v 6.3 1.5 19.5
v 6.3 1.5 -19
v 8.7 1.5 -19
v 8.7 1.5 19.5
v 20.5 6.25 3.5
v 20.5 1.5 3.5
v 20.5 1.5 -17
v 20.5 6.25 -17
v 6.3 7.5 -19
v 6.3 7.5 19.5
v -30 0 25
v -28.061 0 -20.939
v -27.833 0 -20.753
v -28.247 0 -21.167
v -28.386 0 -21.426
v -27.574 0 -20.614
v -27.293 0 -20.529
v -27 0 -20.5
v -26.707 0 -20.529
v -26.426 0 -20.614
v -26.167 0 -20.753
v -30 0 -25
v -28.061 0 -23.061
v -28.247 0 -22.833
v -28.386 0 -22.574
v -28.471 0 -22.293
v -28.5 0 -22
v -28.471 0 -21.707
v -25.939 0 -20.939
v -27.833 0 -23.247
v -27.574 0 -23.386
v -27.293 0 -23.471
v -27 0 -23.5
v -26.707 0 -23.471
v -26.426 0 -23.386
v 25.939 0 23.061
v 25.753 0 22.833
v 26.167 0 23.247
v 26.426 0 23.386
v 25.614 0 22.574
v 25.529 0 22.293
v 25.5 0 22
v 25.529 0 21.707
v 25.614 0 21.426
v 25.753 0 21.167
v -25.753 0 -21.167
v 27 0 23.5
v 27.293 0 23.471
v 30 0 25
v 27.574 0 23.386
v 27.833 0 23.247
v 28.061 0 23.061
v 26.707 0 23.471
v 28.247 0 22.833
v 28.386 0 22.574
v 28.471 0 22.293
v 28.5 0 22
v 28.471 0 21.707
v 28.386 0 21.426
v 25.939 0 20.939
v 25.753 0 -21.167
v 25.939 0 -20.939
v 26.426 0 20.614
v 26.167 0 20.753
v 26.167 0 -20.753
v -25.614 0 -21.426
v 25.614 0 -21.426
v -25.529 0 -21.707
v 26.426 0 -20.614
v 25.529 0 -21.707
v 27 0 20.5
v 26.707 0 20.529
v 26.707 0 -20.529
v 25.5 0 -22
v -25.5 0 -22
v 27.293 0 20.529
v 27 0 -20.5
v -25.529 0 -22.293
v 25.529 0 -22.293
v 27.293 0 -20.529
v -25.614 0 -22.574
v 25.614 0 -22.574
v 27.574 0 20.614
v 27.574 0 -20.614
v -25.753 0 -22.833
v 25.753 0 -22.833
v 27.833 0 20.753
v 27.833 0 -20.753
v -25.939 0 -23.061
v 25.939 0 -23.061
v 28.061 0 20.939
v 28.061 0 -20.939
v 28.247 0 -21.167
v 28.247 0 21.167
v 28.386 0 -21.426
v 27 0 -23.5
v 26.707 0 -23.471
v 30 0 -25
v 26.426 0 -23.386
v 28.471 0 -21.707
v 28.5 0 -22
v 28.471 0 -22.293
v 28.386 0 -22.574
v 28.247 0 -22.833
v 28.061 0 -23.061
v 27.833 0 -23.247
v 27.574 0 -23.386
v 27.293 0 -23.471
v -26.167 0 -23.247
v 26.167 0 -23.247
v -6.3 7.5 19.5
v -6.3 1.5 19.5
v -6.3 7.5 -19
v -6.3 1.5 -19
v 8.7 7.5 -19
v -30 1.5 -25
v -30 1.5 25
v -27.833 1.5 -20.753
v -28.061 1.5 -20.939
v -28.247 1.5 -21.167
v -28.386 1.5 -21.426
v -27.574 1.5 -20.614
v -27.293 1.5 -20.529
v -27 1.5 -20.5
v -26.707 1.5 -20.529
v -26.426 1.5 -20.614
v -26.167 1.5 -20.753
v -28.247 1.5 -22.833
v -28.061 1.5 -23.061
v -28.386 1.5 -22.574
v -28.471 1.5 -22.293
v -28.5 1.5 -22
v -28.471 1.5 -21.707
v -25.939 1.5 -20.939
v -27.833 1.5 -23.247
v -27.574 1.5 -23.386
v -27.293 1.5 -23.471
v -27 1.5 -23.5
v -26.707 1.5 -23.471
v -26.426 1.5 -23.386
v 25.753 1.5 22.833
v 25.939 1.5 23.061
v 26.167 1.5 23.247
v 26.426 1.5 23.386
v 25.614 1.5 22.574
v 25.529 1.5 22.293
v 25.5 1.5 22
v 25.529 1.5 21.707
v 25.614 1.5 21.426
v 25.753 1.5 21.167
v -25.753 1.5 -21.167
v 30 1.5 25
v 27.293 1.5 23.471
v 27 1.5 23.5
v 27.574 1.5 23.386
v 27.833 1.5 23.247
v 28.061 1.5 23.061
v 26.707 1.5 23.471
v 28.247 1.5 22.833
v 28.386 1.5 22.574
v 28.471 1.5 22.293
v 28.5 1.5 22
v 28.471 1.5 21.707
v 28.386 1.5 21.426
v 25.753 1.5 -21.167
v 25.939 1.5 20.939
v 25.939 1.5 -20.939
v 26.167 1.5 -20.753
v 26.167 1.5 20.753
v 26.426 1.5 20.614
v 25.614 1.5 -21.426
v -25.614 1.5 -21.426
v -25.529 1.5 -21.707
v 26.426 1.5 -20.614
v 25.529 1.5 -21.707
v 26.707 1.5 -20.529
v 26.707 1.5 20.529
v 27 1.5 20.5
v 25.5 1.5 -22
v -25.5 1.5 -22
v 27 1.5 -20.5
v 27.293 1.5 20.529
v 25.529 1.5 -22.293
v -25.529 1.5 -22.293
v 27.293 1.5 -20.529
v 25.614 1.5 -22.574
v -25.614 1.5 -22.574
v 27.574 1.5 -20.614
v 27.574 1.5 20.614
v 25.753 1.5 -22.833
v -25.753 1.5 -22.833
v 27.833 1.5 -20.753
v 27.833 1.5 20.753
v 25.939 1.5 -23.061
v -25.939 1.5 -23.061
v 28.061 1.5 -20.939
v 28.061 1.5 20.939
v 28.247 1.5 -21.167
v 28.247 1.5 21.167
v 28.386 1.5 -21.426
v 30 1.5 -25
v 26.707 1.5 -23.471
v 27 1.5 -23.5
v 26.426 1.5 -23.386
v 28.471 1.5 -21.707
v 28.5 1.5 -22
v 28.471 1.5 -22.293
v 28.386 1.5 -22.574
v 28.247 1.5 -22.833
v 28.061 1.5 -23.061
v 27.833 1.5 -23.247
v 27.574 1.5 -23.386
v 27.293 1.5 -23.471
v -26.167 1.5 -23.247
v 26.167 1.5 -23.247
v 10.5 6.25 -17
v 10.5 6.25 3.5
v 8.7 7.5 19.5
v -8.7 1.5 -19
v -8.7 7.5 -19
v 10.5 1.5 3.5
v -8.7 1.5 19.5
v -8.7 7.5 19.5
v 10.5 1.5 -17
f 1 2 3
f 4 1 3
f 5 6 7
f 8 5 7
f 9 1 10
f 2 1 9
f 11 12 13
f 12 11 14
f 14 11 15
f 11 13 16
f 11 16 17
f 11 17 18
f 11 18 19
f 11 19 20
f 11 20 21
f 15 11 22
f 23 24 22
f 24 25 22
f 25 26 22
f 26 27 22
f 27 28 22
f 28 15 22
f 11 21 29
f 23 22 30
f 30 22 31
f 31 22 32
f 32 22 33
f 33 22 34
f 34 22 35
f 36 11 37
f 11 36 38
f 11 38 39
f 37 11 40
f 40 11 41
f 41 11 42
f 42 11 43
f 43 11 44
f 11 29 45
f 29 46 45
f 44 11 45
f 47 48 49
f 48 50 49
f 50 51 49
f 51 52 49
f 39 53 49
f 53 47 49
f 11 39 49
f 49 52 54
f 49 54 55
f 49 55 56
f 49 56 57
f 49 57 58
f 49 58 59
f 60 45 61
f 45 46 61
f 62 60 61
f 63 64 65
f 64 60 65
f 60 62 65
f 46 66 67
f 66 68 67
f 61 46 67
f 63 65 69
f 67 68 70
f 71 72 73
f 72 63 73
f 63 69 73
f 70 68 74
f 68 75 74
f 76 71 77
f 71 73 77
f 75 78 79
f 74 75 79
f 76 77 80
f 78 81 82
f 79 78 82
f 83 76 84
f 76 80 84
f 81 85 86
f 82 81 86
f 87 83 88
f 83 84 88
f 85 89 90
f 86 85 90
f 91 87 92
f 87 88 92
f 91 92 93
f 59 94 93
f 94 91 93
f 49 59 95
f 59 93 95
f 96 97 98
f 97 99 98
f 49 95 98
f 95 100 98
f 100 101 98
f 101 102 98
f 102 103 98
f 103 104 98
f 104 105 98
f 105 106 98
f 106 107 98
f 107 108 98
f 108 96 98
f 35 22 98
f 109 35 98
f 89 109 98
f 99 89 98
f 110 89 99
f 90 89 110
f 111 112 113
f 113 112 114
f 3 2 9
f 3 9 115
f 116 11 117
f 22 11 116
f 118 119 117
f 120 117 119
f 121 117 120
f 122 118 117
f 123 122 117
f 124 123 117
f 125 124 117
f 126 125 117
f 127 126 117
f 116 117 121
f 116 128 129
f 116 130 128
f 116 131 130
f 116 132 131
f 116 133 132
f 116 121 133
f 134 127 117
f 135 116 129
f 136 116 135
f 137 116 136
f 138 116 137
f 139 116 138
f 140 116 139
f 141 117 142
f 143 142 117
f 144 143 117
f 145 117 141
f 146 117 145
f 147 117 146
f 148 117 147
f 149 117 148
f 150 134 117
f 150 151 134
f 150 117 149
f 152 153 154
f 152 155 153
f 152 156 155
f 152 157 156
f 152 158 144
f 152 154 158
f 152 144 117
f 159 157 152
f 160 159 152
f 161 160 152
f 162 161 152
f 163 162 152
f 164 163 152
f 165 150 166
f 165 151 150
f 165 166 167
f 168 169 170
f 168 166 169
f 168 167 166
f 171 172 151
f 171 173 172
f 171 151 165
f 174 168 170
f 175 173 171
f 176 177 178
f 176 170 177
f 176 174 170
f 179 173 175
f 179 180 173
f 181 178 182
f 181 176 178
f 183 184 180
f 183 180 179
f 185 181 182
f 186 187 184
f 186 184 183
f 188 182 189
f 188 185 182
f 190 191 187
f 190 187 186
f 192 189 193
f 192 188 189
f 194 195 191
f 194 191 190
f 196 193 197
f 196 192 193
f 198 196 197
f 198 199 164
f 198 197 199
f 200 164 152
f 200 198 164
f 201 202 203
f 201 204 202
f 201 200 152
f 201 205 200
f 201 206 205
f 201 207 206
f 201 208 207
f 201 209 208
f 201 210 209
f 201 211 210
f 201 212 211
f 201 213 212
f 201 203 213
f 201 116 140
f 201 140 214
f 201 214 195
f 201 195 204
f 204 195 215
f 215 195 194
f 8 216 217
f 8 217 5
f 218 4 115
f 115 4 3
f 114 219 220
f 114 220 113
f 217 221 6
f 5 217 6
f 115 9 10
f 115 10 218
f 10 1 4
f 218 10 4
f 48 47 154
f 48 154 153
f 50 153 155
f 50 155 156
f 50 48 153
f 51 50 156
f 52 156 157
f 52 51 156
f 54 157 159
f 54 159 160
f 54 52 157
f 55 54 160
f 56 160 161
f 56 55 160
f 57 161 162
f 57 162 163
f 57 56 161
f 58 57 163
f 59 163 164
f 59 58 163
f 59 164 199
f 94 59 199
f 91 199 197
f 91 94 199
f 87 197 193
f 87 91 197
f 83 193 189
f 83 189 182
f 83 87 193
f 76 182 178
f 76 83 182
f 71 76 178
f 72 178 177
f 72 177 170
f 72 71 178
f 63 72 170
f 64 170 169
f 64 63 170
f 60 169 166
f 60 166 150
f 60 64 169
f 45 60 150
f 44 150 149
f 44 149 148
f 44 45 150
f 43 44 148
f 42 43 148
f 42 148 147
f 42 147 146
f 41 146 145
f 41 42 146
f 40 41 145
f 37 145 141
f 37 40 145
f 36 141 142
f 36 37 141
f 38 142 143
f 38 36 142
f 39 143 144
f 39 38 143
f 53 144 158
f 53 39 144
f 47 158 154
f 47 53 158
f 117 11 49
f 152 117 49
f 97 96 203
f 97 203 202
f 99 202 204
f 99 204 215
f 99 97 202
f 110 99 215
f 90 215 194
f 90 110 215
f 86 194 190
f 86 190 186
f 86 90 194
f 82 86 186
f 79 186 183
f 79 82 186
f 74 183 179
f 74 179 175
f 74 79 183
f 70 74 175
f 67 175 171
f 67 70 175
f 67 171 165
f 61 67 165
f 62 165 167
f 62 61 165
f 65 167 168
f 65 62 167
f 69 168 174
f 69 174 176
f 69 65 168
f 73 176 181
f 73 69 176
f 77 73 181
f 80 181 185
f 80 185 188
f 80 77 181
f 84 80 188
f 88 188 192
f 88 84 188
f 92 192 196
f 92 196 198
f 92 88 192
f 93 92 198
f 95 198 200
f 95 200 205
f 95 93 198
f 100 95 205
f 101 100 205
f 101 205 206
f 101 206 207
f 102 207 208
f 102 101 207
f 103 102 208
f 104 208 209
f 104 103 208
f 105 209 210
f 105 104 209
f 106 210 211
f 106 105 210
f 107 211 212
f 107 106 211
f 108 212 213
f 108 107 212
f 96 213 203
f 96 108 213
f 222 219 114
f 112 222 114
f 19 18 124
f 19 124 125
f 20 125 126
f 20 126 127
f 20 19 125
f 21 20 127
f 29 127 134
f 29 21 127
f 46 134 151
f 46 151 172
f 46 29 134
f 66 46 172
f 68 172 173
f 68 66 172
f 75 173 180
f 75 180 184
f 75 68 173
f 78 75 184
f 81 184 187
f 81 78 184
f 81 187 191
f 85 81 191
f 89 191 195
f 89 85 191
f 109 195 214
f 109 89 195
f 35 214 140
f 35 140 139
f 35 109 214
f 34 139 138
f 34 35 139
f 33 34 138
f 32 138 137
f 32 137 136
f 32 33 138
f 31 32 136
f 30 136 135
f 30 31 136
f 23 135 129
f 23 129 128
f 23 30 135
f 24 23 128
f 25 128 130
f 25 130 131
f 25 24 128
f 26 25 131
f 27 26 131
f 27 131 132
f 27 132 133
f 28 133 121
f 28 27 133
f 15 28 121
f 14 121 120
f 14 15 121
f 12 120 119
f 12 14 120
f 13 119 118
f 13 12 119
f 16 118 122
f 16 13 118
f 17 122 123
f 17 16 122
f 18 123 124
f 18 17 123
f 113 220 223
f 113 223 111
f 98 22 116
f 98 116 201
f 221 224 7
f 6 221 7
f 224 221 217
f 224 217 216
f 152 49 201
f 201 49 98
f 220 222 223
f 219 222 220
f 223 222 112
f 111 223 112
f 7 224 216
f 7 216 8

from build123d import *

# Parameters (mm, degrees)
SKETCH1_W                   = 60
SKETCH1_H                   = 50
SKETCH1_R                   = 1.5
PCB_DEPTH                   = 1.5
SKETCH2_W                   = 2.4
SKETCH2_H                   = 38.5
NANO_FEMALE_HEADERS_DEPTH   = 6
NANO_FEMALE_HEADERS_2_DEPTH = 6
SKETCH3_W                   = 10
SKETCH3_H                   = 20.5
DIP16_SOCKET_DEPTH          = 4.75


with BuildPart() as part:
    # Sketch1 → pcb (new body)
    with BuildSketch(Plane(origin=(0, 0, 0), x_dir=(1, 0, 0), z_dir=(0, 1, 0))):
        Rectangle(SKETCH1_W, SKETCH1_H)
        with Locations(Location((-27, 22, 0), (0, 0, 270))):
            Circle(SKETCH1_R, mode=Mode.SUBTRACT)
        with Locations(Location((27, 22, 0), (0, 0, 90))):
            Circle(SKETCH1_R, mode=Mode.SUBTRACT)
        with Locations(Location((27, -22, 0), (0, 0, 270))):
            Circle(SKETCH1_R, mode=Mode.SUBTRACT)
    extrude(amount=PCB_DEPTH)


with BuildPart() as body_2:
    # Sketch2 → nano_female_headers (new body)
    with BuildSketch(Plane(origin=(0, 1.5, 0), x_dir=(1, 0, 0), z_dir=(0, 1, 0))):
        with Locations((-7.5, -0.25)):
            Rectangle(SKETCH2_W, SKETCH2_H)
    extrude(amount=NANO_FEMALE_HEADERS_DEPTH)


with BuildPart() as body_3:
    # Sketch2 → nano_female_headers 2 (new body)
    with BuildSketch(Plane(origin=(0, 1.5, 0), x_dir=(1, 0, 0), z_dir=(0, 1, 0))):
        with Locations((7.5, -0.25)):
            Rectangle(SKETCH2_W, SKETCH2_H)
    extrude(amount=NANO_FEMALE_HEADERS_2_DEPTH)


with BuildPart() as body_4:
    # Sketch3 → dip16_socket (new body)
    with BuildSketch(Plane(origin=(0, 1.5, 0), x_dir=(1, 0, 0), z_dir=(0, 1, 0))):
        with Locations((15.5, 6.75)):
            Rectangle(SKETCH3_W, SKETCH3_H)
    extrude(amount=DIP16_SOCKET_DEPTH)


solid = Compound([part.part, body_2.part, body_3.part, body_4.part])
